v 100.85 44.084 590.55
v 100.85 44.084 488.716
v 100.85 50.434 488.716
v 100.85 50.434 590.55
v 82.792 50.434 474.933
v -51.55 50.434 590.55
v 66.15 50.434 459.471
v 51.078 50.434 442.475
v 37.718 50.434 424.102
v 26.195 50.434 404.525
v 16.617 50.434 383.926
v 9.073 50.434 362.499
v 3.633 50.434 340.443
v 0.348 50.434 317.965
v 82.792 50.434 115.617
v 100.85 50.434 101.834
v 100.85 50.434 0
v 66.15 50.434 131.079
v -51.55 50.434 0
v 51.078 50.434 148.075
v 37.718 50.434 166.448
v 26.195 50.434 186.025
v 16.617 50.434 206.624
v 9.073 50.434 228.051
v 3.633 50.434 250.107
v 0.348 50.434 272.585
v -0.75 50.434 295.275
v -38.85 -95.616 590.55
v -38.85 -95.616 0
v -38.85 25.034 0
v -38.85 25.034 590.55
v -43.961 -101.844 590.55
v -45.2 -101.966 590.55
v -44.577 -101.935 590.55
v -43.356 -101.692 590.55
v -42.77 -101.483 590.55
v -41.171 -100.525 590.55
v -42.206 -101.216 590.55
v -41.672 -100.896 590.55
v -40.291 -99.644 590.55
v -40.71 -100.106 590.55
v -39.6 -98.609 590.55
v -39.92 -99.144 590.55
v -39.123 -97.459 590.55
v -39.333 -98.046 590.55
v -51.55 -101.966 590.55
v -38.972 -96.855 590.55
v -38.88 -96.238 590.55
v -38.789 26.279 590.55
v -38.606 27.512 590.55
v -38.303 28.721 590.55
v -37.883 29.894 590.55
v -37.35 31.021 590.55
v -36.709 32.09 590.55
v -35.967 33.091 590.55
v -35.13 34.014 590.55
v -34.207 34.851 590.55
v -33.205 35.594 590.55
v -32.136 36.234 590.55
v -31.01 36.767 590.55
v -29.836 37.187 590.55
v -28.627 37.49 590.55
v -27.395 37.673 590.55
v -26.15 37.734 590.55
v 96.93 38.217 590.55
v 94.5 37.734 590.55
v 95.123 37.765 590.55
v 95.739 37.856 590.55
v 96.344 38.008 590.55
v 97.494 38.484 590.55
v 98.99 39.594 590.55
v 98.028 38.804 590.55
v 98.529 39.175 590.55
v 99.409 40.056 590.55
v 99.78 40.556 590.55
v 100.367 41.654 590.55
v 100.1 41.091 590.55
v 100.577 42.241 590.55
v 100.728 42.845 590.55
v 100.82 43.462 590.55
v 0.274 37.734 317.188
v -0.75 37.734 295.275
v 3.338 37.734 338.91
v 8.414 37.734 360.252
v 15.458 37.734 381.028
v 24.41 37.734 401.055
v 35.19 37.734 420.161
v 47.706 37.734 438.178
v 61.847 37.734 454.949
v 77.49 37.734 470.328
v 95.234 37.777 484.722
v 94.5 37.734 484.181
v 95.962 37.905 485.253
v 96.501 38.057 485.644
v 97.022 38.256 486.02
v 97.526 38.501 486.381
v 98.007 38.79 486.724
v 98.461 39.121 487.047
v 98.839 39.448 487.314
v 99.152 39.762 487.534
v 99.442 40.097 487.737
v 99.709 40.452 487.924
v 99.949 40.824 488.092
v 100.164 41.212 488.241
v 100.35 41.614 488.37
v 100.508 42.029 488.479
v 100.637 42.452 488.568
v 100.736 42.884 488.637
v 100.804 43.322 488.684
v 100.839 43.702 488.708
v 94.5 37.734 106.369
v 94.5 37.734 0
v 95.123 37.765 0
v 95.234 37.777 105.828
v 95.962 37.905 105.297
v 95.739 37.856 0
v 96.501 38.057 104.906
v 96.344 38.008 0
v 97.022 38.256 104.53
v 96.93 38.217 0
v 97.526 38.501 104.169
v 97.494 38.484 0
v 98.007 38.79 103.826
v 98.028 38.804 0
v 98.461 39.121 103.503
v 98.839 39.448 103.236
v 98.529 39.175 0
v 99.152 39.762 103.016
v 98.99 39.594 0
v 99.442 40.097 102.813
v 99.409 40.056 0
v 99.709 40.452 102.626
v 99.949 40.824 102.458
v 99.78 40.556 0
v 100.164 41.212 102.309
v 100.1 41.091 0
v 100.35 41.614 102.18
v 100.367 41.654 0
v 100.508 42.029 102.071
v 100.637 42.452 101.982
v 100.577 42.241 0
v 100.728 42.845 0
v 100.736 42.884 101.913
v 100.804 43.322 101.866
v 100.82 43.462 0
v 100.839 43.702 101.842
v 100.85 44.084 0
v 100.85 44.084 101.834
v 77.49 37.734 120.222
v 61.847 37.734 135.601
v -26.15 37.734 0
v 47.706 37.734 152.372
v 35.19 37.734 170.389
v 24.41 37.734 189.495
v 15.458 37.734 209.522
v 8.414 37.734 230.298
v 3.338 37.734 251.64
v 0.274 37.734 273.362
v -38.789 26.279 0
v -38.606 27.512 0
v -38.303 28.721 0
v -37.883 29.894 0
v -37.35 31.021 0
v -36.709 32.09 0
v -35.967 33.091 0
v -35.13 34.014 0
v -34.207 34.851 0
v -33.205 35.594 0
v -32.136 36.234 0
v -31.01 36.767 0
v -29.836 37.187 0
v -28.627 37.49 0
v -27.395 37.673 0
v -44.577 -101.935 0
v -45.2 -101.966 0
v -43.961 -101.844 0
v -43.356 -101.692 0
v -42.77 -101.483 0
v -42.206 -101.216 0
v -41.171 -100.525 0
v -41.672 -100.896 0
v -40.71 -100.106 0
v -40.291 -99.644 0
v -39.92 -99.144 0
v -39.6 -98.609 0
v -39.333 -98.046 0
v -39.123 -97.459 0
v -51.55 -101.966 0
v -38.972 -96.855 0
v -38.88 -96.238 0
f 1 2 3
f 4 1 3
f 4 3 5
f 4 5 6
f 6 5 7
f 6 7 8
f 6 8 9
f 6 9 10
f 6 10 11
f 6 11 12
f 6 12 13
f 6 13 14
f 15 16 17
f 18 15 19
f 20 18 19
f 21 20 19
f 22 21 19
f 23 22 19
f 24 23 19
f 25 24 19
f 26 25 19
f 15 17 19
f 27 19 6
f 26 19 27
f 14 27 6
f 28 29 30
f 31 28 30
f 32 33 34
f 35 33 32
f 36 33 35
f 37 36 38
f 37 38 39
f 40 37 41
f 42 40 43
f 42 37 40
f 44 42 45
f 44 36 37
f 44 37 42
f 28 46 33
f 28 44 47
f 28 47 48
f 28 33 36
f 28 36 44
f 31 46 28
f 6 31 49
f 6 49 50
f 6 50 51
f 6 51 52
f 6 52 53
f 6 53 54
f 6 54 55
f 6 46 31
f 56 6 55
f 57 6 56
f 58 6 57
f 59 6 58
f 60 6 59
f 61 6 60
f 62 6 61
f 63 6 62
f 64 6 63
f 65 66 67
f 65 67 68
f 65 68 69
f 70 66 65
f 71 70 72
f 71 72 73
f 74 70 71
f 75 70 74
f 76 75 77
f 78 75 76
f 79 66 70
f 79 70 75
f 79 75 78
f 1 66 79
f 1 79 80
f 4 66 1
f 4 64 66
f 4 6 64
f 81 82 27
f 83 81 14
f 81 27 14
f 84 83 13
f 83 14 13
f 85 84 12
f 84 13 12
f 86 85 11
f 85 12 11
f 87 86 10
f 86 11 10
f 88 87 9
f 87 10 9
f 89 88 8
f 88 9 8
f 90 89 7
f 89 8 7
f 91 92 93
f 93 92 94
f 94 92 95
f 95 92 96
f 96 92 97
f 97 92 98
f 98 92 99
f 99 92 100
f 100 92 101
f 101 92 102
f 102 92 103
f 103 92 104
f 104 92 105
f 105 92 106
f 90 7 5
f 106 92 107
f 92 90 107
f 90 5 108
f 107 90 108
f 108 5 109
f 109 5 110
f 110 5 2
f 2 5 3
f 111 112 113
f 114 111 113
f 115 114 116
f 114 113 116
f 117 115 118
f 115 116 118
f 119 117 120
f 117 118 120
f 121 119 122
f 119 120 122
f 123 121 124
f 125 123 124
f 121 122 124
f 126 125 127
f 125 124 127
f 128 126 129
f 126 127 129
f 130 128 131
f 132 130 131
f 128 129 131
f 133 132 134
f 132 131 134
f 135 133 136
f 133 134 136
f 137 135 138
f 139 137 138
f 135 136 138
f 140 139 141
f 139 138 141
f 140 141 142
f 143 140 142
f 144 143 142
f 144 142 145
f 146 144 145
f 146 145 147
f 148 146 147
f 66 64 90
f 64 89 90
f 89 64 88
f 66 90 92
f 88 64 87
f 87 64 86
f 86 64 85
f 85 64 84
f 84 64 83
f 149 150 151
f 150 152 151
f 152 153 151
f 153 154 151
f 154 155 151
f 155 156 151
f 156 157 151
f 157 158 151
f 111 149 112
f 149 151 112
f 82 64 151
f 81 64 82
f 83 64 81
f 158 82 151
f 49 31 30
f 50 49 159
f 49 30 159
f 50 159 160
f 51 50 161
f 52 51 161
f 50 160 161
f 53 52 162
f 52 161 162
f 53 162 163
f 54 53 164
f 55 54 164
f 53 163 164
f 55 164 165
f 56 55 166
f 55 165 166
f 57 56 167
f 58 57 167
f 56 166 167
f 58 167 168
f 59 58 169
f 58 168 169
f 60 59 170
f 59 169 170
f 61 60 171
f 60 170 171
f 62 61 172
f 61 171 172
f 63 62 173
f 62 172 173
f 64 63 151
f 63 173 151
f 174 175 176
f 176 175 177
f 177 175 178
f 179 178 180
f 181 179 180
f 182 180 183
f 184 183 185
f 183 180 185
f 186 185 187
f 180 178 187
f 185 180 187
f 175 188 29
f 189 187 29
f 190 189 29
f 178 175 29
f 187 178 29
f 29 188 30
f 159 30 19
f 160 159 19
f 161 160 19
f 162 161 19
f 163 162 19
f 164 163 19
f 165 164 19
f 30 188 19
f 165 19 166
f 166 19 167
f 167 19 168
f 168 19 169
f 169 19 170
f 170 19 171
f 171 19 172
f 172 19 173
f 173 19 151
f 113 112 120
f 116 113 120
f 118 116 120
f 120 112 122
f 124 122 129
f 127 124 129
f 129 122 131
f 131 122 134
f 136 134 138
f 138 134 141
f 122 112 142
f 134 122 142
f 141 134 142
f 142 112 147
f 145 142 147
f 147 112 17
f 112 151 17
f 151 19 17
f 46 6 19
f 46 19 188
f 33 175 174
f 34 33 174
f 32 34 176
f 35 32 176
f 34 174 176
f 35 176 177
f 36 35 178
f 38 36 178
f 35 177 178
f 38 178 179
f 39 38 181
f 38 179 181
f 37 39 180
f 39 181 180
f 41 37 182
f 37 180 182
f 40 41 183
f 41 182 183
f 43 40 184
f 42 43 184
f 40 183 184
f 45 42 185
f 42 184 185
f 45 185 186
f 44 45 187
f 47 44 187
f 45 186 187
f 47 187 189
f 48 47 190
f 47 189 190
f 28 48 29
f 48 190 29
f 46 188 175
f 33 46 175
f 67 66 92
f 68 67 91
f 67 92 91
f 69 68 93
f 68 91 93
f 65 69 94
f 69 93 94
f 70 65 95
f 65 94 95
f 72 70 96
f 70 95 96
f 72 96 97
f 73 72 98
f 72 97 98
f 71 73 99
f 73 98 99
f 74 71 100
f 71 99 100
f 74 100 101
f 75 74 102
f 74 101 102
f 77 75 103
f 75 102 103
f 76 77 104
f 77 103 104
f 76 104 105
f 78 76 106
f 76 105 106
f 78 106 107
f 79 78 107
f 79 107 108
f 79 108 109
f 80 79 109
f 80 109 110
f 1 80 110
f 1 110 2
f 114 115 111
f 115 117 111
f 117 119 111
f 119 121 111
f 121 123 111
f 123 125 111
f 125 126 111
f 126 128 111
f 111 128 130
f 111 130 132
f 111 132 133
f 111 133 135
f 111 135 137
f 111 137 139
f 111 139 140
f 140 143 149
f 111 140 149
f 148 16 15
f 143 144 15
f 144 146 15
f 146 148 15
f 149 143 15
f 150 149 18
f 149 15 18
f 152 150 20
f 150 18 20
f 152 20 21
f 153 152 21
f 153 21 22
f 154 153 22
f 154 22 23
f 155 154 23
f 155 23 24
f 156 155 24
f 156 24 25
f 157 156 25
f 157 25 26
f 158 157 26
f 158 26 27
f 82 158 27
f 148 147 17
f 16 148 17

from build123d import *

# Parameters (mm, degrees)
F1_DEPTH = 590.55
F3_DEPTH = 25.4


with BuildPart() as f1:
    # F0 (on Top) → F1 (new body)
    with BuildSketch(Plane.XY):
        with BuildLine():
            Line((100.850261, 44.084094), (100.850261, 50.434094))
            Line((100.850261, 50.434094), (-51.549739, 50.434094))
            Line((-51.549739, 50.434094), (-51.549739, -101.965906))
            Line((-51.549739, -101.965906), (-45.199739, -101.965906))
            ThreePointArc((-45.199739, -101.965906), (-40.709611, -100.106034), (-38.849739, -95.615906))
            Line((-38.849739, -95.615906), (-38.849739, 25.034094))
            ThreePointArc((-38.849739, 25.034094), (-35.129995, 34.01435), (-26.149739, 37.734094))
            Line((-26.149739, 37.734094), (94.500261, 37.734094))
            ThreePointArc((94.500261, 37.734094), (98.990389, 39.593966), (100.850261, 44.084094))
        make_face()
    extrude(amount=F1_DEPTH)

    # F2 (on face) → F3 (cut)
    with BuildSketch(Plane(origin=(0, 50.434094, 0), x_dir=(-1, 0, 0), z_dir=(0, 1, 0))):
        with BuildLine():
            ThreePointArc((-100.850261, 101.834363), (-26.195351, 186.025469), (0.749739, 295.275))
            ThreePointArc((0.749739, 295.275), (-26.195351, 404.524531), (-100.850261, 488.715637))
            Line((-100.850261, 488.715637), (-100.850261, 101.834363))
        make_face()
    extrude(amount=-F3_DEPTH, mode=Mode.SUBTRACT)


solid = f1.part
